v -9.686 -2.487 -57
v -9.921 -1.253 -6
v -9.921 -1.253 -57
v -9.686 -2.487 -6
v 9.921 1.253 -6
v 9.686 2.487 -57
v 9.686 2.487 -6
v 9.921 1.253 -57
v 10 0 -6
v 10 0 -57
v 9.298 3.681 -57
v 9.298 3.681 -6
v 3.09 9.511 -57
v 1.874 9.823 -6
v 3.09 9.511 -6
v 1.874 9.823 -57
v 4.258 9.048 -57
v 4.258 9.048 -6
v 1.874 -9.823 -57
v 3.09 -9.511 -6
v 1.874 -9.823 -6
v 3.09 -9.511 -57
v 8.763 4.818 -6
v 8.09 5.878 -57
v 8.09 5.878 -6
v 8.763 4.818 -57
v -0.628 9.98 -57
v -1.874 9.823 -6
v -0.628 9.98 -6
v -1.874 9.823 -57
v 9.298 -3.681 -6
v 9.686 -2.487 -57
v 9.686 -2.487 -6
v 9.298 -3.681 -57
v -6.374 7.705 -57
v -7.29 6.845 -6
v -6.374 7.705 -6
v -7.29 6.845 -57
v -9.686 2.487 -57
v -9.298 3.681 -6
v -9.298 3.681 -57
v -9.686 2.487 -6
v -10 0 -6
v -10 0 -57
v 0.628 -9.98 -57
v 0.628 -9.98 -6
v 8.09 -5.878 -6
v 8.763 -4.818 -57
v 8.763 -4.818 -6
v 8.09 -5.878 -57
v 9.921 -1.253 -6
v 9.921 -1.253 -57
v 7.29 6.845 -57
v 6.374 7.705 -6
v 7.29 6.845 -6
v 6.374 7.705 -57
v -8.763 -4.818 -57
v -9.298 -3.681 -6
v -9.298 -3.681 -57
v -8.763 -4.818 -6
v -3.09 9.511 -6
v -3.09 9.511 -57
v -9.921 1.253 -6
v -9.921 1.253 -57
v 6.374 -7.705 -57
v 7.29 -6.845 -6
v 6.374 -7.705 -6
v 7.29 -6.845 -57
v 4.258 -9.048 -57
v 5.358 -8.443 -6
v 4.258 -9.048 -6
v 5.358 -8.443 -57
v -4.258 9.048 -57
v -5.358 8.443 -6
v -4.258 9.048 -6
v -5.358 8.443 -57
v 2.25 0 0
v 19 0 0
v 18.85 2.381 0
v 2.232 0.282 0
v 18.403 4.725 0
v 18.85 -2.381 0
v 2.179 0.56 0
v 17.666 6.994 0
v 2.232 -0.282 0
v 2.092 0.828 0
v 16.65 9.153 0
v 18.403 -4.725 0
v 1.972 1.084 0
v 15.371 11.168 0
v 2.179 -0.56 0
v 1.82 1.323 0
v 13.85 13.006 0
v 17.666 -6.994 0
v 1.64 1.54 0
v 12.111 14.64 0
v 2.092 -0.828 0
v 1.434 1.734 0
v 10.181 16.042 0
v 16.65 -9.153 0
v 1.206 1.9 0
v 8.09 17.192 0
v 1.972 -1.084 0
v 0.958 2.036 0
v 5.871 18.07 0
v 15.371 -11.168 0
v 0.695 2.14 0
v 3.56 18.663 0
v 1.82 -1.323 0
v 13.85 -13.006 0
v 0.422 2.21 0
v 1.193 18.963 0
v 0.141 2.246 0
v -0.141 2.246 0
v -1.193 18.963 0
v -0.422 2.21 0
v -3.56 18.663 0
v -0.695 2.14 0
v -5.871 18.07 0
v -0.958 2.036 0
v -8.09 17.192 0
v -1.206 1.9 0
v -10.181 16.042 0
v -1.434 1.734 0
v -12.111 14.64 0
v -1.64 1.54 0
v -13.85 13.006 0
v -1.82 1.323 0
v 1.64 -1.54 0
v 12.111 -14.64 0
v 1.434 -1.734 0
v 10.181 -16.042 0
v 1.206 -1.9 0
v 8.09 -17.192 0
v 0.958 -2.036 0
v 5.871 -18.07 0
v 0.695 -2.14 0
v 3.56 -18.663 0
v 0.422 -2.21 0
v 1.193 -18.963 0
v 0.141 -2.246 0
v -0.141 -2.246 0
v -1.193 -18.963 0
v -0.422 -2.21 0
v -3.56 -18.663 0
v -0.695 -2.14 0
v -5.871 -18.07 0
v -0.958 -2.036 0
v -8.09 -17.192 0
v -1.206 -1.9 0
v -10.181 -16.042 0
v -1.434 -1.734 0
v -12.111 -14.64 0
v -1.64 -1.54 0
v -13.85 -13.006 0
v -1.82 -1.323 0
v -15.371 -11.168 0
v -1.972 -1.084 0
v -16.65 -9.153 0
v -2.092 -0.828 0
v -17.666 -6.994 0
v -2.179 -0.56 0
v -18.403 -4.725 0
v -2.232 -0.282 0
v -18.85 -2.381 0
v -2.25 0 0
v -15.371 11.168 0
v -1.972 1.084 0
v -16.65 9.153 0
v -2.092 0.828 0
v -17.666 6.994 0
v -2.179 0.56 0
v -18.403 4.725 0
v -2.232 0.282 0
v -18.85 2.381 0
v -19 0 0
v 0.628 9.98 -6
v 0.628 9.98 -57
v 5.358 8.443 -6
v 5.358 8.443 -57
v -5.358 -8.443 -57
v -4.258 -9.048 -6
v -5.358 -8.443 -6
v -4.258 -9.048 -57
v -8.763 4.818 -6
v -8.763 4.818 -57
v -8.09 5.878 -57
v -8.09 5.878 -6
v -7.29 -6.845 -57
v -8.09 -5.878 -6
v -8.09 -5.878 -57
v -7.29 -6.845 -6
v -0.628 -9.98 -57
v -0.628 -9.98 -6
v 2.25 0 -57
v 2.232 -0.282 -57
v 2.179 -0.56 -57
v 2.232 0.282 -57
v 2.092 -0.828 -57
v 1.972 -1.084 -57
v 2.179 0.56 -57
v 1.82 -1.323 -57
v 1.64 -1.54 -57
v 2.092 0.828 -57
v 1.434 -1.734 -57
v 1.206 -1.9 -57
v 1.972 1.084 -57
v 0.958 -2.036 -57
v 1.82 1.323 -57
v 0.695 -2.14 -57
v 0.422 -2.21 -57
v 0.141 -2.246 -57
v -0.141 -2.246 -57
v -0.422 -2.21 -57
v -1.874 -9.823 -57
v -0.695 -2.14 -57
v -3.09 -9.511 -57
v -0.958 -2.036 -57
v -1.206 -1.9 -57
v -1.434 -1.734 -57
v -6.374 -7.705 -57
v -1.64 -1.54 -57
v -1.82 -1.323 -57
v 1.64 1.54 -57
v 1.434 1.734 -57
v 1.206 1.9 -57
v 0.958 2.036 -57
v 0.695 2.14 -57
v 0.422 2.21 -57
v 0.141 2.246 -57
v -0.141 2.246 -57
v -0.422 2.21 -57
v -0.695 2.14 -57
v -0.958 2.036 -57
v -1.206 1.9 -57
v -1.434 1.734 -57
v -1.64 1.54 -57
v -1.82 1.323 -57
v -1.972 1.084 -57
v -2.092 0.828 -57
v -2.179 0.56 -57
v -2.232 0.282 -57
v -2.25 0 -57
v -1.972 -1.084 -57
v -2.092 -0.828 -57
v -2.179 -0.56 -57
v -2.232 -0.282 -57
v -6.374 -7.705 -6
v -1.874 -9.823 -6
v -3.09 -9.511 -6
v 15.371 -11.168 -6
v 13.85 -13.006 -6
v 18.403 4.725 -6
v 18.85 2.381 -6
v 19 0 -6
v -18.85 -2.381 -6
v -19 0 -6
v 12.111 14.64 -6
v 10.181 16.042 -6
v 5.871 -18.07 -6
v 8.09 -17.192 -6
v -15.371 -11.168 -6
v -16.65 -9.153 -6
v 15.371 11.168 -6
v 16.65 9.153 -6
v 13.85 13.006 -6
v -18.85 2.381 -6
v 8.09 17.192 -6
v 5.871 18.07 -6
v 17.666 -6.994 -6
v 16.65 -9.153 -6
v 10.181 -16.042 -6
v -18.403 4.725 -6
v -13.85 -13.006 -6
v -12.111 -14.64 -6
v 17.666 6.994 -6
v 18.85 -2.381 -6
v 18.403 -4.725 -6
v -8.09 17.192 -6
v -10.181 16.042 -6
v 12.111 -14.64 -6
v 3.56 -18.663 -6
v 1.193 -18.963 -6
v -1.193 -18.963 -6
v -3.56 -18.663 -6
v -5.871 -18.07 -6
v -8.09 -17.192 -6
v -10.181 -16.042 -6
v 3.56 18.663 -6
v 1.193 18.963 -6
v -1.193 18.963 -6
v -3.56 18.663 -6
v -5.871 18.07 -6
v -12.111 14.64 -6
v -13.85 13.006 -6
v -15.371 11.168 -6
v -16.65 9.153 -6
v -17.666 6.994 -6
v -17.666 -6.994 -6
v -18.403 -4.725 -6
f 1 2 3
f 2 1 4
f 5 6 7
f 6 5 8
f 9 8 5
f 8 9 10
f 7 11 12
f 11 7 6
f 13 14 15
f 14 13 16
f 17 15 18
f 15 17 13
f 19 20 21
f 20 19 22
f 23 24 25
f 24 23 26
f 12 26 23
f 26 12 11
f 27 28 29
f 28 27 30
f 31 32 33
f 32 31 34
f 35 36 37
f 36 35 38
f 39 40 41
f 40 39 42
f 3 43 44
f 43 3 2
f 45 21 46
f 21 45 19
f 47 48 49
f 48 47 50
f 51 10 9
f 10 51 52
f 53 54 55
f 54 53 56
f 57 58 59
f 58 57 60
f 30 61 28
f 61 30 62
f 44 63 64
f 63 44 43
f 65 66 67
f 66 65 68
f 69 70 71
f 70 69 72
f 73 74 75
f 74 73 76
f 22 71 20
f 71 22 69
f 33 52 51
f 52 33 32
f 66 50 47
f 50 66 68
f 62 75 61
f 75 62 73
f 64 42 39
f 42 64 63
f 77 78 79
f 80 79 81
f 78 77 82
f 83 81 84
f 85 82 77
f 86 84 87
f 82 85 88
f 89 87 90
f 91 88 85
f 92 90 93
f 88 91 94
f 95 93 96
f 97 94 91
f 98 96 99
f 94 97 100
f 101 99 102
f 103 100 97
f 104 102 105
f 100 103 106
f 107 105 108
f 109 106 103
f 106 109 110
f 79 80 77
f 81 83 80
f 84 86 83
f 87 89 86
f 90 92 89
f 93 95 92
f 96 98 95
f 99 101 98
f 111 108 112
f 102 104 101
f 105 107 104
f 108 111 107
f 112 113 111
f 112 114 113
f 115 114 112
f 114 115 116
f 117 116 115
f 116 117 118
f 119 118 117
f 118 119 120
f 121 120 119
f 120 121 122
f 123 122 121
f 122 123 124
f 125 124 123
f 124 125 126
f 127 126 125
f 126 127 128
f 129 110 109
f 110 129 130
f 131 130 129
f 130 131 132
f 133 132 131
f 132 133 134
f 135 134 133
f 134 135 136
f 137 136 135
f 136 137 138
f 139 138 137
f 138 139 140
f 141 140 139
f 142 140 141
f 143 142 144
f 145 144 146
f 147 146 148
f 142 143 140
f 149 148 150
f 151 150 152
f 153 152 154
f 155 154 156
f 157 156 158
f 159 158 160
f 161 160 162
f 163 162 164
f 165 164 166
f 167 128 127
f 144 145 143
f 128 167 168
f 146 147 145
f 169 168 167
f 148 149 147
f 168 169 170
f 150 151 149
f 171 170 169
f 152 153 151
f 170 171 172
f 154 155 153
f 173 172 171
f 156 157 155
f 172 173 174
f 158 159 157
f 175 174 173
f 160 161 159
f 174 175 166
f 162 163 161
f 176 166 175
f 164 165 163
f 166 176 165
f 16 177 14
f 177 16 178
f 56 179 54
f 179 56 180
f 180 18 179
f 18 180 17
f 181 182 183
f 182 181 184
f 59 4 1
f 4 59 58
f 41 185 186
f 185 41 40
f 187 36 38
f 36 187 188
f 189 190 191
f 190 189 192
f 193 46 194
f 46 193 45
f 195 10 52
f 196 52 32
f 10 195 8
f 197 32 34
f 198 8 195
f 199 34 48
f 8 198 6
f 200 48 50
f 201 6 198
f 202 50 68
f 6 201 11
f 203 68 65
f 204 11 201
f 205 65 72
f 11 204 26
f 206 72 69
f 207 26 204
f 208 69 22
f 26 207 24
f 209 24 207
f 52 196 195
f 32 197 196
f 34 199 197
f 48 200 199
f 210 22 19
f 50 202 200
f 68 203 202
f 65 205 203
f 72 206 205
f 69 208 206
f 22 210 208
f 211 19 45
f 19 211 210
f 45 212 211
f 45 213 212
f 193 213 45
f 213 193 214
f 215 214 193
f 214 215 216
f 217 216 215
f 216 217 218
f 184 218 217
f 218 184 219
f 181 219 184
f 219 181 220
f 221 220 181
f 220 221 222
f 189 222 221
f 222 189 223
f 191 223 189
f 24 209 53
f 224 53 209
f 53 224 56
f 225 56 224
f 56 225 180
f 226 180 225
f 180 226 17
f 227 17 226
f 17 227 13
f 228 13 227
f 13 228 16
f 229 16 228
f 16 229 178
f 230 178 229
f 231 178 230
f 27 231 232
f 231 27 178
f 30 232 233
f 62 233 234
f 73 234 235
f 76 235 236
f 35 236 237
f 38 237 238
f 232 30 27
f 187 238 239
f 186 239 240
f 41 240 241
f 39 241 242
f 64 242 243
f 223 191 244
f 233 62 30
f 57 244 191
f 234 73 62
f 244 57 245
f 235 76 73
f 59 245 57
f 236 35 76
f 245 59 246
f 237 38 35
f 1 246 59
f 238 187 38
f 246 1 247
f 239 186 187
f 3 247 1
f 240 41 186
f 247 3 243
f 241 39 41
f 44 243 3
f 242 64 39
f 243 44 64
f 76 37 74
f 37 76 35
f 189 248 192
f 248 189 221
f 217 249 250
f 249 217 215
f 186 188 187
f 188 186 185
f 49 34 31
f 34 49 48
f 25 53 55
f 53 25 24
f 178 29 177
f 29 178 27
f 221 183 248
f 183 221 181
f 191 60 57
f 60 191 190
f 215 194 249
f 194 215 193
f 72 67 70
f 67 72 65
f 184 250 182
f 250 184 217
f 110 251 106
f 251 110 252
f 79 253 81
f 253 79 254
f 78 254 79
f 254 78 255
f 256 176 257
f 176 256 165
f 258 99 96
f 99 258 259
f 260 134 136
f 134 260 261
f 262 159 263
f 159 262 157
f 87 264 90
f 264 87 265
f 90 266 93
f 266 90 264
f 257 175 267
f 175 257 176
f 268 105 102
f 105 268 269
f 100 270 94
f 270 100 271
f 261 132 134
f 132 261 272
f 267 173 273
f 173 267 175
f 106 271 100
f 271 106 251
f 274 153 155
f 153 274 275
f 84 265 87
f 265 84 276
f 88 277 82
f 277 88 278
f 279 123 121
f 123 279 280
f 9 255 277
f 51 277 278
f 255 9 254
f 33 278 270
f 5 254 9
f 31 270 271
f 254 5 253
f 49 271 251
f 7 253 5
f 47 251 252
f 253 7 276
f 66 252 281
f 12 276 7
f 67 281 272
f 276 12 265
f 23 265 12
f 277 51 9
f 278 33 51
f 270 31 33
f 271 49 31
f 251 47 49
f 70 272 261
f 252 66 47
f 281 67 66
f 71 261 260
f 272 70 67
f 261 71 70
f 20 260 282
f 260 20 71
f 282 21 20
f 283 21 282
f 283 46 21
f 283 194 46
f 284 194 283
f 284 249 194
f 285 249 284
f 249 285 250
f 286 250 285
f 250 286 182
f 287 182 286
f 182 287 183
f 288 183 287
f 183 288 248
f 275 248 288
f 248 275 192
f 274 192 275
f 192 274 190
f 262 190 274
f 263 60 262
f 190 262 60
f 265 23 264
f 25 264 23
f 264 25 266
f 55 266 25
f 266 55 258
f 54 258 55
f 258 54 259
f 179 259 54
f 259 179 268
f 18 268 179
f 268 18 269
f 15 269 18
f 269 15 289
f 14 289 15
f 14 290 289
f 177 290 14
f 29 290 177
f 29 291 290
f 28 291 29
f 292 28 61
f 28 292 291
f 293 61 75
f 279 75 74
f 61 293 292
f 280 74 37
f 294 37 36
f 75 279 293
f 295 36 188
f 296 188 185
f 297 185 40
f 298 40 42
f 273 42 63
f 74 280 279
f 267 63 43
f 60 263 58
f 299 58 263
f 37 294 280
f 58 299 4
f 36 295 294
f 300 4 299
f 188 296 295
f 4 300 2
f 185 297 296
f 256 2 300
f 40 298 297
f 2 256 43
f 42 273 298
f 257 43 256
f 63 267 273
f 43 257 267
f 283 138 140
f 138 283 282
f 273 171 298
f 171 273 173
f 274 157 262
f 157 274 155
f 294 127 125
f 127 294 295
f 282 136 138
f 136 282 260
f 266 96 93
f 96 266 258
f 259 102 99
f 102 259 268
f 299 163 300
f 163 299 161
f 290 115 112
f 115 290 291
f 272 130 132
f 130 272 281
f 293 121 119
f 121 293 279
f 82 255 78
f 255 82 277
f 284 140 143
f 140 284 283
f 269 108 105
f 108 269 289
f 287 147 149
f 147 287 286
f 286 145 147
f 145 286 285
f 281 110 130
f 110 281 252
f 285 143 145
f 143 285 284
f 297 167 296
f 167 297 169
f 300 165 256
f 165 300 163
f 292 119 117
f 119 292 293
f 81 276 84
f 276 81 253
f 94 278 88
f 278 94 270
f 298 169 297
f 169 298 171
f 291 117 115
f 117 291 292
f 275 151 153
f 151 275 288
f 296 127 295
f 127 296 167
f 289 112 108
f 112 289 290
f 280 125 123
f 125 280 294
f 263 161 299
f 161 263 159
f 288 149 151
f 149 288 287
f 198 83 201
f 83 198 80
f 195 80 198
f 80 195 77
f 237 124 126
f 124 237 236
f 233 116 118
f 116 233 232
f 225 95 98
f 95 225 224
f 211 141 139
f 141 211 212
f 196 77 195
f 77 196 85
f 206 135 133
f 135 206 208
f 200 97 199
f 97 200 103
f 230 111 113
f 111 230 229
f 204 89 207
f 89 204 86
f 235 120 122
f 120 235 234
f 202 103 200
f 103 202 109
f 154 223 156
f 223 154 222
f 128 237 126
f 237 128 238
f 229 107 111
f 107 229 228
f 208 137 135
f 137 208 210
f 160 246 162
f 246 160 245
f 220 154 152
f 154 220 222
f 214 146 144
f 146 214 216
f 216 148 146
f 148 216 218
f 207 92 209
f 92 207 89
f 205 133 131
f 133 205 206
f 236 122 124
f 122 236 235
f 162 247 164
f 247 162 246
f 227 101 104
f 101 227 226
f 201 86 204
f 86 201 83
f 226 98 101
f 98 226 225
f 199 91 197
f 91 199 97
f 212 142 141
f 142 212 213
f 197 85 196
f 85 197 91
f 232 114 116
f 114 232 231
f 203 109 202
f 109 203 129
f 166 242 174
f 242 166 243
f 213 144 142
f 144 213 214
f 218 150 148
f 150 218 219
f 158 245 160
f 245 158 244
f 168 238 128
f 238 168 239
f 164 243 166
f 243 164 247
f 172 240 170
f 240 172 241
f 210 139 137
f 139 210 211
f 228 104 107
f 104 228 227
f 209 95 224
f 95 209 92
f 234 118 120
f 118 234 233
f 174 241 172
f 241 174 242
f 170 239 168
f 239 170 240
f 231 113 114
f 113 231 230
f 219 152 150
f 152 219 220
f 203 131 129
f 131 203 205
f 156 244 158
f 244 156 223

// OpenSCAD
$fn = 50;


difference() {
	union() {
		translate(v = [0, 0, -57.0000000000]) {
			cylinder(h = 57, r = 10.0000000000);
		}
		translate(v = [0, 0, -6.0000000000]) {
			cylinder(h = 6, r = 19.0000000000);
		}
	}
	union() {
		#translate(v = [0, 0, -57]) {
			cylinder(h = 57, r = 2.2500000000);
		}
	}
}
